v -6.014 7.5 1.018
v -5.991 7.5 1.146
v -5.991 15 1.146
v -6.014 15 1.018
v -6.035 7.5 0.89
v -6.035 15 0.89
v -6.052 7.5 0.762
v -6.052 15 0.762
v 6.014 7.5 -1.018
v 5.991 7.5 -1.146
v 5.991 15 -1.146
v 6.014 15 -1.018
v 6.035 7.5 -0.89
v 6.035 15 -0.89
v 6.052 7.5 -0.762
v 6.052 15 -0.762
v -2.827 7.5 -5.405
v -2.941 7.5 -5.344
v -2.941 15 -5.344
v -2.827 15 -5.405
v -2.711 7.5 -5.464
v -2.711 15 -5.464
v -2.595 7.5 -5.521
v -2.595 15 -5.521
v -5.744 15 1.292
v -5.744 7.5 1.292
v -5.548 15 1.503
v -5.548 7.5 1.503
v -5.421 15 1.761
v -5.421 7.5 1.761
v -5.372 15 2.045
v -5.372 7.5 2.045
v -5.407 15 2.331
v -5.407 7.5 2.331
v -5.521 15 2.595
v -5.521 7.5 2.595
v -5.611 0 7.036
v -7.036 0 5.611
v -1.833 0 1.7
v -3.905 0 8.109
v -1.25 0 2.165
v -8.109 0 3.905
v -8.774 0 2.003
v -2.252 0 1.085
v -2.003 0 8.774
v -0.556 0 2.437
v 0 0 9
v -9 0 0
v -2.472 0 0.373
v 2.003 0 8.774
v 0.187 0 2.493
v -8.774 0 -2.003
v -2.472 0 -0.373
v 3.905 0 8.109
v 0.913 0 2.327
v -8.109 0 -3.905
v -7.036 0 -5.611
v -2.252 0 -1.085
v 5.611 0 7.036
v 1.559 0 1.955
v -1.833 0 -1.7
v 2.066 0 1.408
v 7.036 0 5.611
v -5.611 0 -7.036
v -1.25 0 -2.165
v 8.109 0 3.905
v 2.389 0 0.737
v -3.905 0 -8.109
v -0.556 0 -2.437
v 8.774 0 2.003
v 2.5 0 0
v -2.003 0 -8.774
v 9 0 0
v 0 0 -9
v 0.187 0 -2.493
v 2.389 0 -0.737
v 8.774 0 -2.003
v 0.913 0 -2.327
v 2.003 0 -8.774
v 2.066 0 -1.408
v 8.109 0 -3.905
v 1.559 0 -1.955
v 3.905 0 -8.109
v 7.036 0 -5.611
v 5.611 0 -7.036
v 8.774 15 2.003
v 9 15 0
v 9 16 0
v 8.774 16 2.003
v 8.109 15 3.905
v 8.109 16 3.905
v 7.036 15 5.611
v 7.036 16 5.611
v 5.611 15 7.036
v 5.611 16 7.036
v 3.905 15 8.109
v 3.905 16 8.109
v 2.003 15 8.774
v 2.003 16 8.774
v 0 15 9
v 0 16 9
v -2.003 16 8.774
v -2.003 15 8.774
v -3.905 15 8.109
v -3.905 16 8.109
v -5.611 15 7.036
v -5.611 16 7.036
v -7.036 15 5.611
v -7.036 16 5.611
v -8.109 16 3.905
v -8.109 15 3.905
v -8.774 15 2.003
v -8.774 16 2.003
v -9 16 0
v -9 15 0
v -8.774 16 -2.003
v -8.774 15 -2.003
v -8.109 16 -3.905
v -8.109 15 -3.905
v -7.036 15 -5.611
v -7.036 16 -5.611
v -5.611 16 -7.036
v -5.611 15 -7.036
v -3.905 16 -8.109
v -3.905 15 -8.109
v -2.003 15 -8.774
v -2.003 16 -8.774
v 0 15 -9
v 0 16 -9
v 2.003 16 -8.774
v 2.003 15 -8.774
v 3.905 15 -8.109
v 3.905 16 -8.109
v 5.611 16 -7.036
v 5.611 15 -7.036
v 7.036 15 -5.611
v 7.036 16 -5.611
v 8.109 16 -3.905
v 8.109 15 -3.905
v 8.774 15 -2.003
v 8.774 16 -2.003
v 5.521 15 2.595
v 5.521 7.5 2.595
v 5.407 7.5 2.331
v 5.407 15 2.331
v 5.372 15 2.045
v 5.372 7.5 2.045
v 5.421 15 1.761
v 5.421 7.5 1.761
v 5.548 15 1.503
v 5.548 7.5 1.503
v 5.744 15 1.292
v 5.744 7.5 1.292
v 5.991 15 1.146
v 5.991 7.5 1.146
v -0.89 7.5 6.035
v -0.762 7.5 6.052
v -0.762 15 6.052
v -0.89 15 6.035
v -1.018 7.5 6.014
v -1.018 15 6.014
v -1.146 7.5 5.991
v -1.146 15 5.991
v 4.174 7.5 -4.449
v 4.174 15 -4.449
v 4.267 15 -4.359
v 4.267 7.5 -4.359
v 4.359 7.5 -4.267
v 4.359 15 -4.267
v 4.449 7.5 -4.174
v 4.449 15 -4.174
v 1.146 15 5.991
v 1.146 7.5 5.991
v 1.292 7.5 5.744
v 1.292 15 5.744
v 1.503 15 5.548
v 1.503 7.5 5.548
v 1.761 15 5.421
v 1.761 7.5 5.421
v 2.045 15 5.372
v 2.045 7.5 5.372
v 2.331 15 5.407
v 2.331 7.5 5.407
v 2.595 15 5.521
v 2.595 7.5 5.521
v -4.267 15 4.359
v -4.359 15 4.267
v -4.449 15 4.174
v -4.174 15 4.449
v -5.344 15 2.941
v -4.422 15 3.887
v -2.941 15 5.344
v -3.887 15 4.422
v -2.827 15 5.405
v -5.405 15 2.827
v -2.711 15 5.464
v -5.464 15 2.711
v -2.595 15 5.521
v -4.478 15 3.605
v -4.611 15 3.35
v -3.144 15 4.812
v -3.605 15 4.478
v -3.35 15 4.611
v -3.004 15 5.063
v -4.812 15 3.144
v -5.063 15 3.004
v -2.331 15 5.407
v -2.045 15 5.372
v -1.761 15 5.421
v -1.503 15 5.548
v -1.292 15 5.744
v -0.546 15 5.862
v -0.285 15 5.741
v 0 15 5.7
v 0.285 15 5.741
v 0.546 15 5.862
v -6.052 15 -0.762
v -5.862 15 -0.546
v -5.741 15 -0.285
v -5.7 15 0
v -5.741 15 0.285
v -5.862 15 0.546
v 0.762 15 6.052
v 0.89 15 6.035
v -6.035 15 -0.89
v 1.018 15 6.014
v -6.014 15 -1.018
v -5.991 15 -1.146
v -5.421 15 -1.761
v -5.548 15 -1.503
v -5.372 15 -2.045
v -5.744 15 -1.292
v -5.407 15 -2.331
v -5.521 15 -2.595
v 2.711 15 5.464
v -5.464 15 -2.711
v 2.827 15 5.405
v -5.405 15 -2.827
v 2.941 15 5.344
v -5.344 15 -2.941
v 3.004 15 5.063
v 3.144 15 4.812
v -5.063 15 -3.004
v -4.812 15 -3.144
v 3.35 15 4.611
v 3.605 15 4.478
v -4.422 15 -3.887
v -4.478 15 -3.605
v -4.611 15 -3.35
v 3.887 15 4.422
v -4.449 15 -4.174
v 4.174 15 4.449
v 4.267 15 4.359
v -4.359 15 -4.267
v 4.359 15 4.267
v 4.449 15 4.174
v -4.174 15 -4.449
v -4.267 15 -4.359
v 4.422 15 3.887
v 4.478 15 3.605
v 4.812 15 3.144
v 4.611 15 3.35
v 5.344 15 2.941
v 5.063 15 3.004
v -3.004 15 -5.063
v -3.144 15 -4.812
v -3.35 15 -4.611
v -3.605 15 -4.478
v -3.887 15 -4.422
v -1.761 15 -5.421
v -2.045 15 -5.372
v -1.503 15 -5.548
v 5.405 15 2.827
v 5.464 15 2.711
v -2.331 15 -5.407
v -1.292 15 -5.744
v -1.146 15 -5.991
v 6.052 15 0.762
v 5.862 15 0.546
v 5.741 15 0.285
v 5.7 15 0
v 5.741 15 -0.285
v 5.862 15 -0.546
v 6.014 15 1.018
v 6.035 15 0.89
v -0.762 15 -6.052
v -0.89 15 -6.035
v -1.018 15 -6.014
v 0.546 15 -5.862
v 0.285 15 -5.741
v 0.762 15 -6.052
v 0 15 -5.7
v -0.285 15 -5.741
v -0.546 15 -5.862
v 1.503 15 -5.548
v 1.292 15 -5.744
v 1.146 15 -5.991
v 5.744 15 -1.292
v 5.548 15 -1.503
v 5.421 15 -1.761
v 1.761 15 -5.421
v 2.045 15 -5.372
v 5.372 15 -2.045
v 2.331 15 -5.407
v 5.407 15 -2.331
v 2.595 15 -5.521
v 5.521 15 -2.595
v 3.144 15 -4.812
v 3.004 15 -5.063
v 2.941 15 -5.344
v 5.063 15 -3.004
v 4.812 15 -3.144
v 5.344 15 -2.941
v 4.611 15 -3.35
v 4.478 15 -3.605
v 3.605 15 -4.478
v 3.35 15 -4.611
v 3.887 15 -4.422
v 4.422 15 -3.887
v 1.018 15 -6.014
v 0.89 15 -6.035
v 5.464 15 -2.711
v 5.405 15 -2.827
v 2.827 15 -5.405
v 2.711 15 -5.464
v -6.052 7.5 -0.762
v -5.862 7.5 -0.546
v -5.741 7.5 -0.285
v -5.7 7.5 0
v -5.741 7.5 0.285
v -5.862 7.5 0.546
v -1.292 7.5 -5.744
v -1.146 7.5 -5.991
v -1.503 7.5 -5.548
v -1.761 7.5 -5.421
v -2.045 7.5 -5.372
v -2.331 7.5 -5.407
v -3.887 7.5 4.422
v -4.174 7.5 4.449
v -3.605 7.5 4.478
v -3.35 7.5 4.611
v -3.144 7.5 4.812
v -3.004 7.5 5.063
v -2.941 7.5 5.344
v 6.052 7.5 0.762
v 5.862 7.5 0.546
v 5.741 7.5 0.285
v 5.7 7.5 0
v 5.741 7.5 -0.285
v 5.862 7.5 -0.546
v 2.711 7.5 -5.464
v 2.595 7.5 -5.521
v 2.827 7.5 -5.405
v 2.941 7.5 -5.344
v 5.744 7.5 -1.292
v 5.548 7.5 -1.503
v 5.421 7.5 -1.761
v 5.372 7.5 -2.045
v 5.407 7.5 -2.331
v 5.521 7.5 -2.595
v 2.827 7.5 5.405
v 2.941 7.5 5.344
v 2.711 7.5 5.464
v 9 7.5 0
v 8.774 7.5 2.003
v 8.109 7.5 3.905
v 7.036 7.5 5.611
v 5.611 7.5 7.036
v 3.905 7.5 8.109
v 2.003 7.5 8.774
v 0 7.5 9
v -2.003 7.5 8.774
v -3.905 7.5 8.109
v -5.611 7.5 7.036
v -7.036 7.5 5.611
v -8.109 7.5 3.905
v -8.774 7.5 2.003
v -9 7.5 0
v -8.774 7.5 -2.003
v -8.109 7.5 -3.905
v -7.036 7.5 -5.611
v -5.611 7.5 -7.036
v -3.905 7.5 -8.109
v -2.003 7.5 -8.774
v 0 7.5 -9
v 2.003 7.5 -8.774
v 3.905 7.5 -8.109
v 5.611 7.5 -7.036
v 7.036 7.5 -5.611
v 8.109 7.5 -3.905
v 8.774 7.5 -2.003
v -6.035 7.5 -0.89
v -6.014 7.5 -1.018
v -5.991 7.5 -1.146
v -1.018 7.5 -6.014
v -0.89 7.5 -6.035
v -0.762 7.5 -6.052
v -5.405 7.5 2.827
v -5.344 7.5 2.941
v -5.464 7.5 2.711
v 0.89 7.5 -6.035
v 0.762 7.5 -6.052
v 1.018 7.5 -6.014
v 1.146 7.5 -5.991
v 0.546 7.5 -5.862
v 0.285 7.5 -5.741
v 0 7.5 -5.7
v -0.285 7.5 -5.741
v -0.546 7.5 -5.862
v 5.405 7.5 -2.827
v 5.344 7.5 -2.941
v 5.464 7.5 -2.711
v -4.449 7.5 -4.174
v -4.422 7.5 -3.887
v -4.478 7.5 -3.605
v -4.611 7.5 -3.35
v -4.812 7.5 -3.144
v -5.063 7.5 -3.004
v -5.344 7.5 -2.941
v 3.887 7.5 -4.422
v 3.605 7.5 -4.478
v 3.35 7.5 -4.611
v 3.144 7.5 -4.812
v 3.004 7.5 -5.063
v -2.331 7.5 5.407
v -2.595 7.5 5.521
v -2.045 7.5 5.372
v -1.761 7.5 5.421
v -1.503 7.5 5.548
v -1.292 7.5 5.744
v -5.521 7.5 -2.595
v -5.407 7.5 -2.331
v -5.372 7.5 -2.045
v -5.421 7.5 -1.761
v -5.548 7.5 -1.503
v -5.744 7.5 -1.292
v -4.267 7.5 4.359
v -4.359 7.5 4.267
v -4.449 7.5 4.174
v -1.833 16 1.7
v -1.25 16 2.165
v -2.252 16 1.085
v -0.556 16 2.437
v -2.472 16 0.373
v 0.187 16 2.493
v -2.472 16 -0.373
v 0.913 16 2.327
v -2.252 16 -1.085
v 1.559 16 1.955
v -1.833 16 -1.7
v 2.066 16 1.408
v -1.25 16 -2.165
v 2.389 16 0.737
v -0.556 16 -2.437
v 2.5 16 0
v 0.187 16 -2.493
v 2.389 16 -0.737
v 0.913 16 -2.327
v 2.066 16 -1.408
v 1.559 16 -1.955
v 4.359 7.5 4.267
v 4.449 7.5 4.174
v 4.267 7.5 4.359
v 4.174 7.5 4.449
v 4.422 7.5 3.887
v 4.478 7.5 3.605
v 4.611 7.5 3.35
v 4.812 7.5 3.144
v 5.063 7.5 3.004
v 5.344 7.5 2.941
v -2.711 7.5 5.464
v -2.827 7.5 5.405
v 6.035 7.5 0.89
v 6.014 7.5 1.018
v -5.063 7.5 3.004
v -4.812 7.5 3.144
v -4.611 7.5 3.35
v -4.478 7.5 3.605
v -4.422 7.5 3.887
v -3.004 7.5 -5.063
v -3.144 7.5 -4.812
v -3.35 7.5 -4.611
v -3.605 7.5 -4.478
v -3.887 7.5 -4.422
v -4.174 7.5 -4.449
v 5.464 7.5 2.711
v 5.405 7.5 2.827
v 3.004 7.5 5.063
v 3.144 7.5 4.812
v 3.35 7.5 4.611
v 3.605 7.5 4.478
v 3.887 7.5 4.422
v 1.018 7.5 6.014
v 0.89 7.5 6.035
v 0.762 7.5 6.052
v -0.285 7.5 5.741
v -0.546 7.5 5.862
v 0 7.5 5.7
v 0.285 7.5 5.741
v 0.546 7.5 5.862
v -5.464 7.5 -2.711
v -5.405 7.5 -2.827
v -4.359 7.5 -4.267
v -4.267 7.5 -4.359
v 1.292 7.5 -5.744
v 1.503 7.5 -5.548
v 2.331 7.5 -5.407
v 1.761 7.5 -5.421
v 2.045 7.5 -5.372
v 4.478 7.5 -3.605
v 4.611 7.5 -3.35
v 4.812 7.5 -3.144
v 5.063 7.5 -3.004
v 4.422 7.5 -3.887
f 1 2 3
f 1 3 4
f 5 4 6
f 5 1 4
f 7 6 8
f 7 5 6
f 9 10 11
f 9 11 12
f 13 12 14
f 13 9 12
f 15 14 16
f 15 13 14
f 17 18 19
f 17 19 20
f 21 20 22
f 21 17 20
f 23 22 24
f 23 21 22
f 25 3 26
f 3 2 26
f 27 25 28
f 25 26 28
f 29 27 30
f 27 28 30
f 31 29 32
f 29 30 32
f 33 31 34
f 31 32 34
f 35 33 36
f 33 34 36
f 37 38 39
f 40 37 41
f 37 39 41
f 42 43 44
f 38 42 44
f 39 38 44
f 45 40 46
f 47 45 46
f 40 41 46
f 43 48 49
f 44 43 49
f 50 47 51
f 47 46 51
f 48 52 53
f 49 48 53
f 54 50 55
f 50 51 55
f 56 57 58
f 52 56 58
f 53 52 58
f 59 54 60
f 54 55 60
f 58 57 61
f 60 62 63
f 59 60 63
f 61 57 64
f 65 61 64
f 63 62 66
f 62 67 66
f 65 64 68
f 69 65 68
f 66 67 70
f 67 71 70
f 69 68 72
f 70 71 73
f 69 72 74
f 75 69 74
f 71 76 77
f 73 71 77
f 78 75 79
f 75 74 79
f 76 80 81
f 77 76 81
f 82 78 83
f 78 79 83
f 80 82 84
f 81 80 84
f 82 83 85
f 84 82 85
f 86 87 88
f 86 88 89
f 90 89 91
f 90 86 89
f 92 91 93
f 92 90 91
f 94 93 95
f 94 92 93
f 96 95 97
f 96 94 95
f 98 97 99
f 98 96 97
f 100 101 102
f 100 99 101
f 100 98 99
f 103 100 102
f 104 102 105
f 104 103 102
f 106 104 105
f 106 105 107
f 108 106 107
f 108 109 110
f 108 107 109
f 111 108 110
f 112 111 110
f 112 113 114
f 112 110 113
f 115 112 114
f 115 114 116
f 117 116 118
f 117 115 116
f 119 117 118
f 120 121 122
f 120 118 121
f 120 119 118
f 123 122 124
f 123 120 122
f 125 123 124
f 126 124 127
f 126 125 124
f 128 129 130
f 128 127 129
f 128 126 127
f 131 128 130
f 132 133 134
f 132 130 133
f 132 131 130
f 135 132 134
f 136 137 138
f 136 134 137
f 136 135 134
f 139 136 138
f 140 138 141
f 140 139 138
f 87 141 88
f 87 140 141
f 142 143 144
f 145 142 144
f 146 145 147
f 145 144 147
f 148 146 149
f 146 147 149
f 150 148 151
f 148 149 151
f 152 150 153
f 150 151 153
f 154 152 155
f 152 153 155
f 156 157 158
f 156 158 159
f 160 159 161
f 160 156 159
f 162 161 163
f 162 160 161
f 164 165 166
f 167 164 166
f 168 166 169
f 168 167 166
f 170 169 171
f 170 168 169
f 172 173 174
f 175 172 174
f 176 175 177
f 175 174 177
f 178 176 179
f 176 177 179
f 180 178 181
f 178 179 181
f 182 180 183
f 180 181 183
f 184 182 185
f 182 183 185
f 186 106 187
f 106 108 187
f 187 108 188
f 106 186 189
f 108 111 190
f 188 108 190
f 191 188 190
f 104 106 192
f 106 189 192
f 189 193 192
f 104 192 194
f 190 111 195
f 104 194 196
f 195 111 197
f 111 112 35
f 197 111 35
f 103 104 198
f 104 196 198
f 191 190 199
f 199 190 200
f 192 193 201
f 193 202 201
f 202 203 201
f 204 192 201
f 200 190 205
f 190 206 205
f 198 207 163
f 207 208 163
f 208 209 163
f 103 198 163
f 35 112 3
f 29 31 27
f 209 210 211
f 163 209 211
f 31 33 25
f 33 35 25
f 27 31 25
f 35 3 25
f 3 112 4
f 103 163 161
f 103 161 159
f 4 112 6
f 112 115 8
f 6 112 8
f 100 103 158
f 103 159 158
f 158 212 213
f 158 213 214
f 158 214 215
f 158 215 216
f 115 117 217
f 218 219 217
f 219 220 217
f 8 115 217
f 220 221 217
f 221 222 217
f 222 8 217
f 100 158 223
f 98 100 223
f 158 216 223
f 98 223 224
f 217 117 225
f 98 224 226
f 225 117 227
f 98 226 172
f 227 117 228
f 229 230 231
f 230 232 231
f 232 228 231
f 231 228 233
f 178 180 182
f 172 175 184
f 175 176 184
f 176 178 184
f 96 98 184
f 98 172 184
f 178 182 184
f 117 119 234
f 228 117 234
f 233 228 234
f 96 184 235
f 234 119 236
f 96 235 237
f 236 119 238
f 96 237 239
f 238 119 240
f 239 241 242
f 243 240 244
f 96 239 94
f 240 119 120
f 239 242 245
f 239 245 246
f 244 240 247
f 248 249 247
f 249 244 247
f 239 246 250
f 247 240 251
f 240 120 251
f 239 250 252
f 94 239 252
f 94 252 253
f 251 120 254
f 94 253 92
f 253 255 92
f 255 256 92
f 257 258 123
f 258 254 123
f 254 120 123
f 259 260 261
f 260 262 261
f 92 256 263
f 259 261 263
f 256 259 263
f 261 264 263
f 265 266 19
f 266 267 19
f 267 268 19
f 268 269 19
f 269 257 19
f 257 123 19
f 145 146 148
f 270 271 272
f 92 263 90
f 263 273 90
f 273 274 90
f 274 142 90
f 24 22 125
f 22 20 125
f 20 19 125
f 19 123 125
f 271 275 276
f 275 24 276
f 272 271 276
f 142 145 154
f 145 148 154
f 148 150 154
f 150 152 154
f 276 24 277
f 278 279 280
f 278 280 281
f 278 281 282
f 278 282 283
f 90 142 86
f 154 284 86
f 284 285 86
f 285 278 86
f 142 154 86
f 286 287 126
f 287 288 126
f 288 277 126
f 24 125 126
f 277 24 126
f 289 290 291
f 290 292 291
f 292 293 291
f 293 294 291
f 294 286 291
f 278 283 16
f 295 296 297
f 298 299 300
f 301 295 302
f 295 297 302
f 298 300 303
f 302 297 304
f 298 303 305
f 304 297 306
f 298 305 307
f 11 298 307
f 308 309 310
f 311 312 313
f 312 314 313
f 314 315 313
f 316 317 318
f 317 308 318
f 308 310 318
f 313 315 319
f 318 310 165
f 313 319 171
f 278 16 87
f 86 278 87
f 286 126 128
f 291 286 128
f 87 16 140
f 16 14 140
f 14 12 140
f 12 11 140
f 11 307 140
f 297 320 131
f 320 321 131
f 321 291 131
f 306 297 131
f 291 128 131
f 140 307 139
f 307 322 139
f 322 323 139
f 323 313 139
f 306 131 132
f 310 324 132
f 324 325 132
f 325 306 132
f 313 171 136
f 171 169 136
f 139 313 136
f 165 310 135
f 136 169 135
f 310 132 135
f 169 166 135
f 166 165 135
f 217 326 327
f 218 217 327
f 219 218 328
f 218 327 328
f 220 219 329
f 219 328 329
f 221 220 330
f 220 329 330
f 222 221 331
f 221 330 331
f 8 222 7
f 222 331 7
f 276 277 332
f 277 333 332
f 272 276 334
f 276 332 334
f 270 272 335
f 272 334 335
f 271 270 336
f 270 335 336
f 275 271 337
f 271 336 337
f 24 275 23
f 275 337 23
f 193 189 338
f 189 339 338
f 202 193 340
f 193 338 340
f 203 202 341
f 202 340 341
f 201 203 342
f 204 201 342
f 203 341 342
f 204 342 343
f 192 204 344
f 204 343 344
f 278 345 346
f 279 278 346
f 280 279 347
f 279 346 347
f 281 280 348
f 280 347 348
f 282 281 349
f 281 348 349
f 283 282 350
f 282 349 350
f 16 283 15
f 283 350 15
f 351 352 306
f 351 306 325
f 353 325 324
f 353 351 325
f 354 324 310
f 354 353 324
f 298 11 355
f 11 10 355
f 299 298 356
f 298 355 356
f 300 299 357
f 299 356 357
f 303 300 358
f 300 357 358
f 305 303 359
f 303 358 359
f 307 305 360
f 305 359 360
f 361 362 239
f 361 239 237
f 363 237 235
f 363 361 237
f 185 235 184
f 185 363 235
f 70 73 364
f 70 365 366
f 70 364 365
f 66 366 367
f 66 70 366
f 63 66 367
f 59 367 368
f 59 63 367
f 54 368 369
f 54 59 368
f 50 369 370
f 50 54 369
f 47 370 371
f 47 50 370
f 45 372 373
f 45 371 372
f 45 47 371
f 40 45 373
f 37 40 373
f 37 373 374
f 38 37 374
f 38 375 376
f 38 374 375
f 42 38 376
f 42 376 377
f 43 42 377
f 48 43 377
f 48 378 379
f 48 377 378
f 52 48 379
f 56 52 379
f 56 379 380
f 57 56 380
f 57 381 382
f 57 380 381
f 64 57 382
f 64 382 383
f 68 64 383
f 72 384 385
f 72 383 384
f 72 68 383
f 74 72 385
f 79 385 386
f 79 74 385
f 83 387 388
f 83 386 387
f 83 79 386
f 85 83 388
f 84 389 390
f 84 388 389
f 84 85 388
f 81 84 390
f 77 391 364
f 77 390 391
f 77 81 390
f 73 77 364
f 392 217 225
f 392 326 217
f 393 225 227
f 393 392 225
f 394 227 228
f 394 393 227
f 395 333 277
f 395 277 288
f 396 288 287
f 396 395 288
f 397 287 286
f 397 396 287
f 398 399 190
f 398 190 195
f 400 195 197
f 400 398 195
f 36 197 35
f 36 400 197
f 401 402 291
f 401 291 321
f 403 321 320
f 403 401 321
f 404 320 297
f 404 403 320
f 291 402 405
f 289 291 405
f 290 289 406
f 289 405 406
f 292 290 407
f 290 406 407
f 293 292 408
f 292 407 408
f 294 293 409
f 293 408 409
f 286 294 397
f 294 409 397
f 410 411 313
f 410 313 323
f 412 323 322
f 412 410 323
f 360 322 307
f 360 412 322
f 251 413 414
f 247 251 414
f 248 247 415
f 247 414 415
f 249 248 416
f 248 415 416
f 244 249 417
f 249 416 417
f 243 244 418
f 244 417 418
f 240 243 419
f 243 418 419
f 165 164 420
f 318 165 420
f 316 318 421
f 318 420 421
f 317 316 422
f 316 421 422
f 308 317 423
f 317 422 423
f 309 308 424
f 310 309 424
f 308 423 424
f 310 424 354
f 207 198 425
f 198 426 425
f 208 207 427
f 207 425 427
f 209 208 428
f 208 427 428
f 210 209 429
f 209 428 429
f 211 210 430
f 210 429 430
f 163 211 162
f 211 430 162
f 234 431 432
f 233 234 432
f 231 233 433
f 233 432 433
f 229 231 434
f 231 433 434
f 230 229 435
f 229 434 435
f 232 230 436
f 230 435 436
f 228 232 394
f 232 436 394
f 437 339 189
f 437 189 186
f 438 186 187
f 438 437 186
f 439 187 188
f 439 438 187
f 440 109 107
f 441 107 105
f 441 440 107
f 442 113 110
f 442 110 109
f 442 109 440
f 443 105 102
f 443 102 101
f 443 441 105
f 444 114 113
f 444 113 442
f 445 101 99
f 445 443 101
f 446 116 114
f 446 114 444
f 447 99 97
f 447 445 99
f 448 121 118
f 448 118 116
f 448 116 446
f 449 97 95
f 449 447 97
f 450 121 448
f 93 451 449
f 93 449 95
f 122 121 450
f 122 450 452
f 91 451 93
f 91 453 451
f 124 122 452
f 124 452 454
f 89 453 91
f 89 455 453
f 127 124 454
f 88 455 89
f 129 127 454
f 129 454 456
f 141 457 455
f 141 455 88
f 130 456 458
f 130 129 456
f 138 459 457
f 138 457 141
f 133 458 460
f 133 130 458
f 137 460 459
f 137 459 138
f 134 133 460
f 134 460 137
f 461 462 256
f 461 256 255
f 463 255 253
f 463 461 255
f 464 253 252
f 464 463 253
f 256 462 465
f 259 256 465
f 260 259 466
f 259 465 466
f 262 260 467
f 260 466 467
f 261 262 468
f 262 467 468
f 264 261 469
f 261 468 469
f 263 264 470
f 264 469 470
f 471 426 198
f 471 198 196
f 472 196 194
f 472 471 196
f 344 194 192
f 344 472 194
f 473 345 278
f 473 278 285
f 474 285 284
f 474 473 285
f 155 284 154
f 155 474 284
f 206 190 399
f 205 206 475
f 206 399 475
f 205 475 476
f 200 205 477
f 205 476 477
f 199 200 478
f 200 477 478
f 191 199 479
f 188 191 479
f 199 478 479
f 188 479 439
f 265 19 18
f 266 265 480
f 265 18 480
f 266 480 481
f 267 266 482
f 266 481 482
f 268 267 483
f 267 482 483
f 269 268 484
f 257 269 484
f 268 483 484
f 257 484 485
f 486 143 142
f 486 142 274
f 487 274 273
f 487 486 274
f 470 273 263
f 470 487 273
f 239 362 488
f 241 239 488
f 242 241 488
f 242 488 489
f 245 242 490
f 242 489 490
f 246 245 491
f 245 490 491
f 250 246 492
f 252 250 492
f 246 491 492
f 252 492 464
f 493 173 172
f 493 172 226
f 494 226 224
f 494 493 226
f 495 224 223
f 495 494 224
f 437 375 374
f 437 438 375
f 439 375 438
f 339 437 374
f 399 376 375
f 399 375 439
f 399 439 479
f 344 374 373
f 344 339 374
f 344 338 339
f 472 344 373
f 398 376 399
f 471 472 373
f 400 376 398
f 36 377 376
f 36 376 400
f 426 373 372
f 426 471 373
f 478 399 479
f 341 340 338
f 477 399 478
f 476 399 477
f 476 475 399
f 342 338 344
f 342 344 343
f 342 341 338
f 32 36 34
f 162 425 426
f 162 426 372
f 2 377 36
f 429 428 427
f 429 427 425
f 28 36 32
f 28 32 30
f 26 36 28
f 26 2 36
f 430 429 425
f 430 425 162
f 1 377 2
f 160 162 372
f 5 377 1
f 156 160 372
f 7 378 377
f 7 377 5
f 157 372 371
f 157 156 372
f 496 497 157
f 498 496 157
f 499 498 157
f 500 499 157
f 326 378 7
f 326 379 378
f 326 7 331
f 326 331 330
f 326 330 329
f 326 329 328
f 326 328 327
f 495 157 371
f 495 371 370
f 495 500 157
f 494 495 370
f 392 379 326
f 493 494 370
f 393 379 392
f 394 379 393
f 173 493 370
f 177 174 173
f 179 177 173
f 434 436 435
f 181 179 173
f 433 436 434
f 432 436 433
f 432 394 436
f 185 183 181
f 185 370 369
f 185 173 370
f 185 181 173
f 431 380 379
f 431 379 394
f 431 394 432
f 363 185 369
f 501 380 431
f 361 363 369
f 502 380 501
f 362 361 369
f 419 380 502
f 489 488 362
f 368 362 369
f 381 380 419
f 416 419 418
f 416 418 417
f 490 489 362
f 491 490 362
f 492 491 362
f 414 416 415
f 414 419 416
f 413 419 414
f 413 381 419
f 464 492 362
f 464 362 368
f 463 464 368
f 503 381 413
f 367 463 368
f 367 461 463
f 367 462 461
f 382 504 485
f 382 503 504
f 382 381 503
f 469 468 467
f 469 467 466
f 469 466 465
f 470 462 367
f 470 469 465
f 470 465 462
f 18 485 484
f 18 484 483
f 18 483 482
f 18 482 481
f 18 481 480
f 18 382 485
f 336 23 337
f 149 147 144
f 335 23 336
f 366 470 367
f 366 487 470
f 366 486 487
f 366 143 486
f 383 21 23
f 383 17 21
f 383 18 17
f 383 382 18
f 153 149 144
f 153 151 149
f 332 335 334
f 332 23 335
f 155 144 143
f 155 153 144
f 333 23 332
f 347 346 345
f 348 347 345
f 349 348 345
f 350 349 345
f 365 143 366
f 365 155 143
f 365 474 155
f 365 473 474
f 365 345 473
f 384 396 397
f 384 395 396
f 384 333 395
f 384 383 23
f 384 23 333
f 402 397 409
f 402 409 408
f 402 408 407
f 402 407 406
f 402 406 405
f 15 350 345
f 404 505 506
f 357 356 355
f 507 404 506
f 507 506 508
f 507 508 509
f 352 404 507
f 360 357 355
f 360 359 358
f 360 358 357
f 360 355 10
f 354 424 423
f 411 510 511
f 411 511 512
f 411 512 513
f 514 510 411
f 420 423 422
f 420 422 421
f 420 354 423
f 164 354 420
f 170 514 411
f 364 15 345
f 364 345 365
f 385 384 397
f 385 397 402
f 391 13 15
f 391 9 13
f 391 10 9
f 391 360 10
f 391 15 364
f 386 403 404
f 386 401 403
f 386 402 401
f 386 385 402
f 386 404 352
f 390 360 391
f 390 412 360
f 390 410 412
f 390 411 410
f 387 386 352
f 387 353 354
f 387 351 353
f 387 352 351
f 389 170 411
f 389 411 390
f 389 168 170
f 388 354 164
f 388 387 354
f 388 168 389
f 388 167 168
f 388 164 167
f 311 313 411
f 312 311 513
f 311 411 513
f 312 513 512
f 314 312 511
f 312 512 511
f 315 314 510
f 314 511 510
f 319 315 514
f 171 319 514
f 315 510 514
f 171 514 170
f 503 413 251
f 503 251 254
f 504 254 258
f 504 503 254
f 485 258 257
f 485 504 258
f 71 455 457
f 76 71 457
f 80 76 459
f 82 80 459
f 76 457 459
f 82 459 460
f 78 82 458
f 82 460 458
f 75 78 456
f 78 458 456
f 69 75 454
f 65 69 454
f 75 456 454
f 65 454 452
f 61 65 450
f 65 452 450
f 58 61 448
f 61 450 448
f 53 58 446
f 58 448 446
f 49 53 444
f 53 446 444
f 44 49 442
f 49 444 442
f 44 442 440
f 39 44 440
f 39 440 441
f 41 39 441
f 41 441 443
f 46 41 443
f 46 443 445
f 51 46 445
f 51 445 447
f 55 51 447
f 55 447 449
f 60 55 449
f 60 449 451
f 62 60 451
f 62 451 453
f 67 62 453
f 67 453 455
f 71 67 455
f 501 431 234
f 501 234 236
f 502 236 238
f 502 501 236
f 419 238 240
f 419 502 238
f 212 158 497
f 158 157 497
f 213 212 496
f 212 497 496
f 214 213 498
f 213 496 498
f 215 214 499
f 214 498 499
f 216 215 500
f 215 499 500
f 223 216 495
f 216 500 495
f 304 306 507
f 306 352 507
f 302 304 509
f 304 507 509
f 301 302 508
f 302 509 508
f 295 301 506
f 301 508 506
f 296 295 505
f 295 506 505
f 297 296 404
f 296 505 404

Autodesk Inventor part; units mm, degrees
ref_plane "YZ Plane" through (0, 0, 0) normal (1, 0, 0) x (0, 1, 0)
ref_plane "XZ Plane" through (0, 0, 0) normal (0, 1, 0) x (-1, 0, 0)
ref_plane "XY Plane" through (0, 0, 0) normal (0, 0, 1) x (1, 0, 0)
sketch "Sketch1" plane through (0, 0, 0) normal (0, 0, 1) x (1, 0, 0)
  line L0 (0, 0) -> (0, 16) construction
  line L1 (0, 16) -> (2.5, 16) construction
  line L2 (2.5, 16) -> (9, 16)
  line L3 (9, 16) -> (9, 15)
  line L4 (9, 15) -> (6.1, 15)
  line L5 (6.1, 15) -> (6.1, 7.5)
  line L6 (6.1, 7.5) -> (9, 7.5)
  line L7 (9, 7.5) -> (9, 0)
  line L8 (9, 0) -> (2.5, 0)
  line L9 (2.5, 0) -> (2.5, 16)
  dimension "d0" = 2.5
  dimension "d1" = 7.5
  dimension "d2" = 7.5
  dimension "d3" = 9
  dimension "d4" = 1
  dimension "d6" = 6.1
revolve "Revolution1" add sketch "Sketch1" angle 360 about axis through (0, 0, 0) along (0, 1, 0)
sketch "Sketch2" plane through (0, 7.5, 0) normal (0, 1, 0) x (1, 0, 0)
  line L0 (0, 0) -> (0, -6.7)
  circle A0 centre (0, -6.7) radius 1
  dimension "d8" = 2
  dimension "d9" = 6.7
extrude "Extrusion1" cut sketch "Sketch2" along normal up to surface (7.5 mm away)
pattern_circular "Circular Pattern1" count 20 over 360 about axis through (0, 11.25, 0) along (0, -1, 0) of "Extrusion1"
properties part number "gt2 20t pulley"
